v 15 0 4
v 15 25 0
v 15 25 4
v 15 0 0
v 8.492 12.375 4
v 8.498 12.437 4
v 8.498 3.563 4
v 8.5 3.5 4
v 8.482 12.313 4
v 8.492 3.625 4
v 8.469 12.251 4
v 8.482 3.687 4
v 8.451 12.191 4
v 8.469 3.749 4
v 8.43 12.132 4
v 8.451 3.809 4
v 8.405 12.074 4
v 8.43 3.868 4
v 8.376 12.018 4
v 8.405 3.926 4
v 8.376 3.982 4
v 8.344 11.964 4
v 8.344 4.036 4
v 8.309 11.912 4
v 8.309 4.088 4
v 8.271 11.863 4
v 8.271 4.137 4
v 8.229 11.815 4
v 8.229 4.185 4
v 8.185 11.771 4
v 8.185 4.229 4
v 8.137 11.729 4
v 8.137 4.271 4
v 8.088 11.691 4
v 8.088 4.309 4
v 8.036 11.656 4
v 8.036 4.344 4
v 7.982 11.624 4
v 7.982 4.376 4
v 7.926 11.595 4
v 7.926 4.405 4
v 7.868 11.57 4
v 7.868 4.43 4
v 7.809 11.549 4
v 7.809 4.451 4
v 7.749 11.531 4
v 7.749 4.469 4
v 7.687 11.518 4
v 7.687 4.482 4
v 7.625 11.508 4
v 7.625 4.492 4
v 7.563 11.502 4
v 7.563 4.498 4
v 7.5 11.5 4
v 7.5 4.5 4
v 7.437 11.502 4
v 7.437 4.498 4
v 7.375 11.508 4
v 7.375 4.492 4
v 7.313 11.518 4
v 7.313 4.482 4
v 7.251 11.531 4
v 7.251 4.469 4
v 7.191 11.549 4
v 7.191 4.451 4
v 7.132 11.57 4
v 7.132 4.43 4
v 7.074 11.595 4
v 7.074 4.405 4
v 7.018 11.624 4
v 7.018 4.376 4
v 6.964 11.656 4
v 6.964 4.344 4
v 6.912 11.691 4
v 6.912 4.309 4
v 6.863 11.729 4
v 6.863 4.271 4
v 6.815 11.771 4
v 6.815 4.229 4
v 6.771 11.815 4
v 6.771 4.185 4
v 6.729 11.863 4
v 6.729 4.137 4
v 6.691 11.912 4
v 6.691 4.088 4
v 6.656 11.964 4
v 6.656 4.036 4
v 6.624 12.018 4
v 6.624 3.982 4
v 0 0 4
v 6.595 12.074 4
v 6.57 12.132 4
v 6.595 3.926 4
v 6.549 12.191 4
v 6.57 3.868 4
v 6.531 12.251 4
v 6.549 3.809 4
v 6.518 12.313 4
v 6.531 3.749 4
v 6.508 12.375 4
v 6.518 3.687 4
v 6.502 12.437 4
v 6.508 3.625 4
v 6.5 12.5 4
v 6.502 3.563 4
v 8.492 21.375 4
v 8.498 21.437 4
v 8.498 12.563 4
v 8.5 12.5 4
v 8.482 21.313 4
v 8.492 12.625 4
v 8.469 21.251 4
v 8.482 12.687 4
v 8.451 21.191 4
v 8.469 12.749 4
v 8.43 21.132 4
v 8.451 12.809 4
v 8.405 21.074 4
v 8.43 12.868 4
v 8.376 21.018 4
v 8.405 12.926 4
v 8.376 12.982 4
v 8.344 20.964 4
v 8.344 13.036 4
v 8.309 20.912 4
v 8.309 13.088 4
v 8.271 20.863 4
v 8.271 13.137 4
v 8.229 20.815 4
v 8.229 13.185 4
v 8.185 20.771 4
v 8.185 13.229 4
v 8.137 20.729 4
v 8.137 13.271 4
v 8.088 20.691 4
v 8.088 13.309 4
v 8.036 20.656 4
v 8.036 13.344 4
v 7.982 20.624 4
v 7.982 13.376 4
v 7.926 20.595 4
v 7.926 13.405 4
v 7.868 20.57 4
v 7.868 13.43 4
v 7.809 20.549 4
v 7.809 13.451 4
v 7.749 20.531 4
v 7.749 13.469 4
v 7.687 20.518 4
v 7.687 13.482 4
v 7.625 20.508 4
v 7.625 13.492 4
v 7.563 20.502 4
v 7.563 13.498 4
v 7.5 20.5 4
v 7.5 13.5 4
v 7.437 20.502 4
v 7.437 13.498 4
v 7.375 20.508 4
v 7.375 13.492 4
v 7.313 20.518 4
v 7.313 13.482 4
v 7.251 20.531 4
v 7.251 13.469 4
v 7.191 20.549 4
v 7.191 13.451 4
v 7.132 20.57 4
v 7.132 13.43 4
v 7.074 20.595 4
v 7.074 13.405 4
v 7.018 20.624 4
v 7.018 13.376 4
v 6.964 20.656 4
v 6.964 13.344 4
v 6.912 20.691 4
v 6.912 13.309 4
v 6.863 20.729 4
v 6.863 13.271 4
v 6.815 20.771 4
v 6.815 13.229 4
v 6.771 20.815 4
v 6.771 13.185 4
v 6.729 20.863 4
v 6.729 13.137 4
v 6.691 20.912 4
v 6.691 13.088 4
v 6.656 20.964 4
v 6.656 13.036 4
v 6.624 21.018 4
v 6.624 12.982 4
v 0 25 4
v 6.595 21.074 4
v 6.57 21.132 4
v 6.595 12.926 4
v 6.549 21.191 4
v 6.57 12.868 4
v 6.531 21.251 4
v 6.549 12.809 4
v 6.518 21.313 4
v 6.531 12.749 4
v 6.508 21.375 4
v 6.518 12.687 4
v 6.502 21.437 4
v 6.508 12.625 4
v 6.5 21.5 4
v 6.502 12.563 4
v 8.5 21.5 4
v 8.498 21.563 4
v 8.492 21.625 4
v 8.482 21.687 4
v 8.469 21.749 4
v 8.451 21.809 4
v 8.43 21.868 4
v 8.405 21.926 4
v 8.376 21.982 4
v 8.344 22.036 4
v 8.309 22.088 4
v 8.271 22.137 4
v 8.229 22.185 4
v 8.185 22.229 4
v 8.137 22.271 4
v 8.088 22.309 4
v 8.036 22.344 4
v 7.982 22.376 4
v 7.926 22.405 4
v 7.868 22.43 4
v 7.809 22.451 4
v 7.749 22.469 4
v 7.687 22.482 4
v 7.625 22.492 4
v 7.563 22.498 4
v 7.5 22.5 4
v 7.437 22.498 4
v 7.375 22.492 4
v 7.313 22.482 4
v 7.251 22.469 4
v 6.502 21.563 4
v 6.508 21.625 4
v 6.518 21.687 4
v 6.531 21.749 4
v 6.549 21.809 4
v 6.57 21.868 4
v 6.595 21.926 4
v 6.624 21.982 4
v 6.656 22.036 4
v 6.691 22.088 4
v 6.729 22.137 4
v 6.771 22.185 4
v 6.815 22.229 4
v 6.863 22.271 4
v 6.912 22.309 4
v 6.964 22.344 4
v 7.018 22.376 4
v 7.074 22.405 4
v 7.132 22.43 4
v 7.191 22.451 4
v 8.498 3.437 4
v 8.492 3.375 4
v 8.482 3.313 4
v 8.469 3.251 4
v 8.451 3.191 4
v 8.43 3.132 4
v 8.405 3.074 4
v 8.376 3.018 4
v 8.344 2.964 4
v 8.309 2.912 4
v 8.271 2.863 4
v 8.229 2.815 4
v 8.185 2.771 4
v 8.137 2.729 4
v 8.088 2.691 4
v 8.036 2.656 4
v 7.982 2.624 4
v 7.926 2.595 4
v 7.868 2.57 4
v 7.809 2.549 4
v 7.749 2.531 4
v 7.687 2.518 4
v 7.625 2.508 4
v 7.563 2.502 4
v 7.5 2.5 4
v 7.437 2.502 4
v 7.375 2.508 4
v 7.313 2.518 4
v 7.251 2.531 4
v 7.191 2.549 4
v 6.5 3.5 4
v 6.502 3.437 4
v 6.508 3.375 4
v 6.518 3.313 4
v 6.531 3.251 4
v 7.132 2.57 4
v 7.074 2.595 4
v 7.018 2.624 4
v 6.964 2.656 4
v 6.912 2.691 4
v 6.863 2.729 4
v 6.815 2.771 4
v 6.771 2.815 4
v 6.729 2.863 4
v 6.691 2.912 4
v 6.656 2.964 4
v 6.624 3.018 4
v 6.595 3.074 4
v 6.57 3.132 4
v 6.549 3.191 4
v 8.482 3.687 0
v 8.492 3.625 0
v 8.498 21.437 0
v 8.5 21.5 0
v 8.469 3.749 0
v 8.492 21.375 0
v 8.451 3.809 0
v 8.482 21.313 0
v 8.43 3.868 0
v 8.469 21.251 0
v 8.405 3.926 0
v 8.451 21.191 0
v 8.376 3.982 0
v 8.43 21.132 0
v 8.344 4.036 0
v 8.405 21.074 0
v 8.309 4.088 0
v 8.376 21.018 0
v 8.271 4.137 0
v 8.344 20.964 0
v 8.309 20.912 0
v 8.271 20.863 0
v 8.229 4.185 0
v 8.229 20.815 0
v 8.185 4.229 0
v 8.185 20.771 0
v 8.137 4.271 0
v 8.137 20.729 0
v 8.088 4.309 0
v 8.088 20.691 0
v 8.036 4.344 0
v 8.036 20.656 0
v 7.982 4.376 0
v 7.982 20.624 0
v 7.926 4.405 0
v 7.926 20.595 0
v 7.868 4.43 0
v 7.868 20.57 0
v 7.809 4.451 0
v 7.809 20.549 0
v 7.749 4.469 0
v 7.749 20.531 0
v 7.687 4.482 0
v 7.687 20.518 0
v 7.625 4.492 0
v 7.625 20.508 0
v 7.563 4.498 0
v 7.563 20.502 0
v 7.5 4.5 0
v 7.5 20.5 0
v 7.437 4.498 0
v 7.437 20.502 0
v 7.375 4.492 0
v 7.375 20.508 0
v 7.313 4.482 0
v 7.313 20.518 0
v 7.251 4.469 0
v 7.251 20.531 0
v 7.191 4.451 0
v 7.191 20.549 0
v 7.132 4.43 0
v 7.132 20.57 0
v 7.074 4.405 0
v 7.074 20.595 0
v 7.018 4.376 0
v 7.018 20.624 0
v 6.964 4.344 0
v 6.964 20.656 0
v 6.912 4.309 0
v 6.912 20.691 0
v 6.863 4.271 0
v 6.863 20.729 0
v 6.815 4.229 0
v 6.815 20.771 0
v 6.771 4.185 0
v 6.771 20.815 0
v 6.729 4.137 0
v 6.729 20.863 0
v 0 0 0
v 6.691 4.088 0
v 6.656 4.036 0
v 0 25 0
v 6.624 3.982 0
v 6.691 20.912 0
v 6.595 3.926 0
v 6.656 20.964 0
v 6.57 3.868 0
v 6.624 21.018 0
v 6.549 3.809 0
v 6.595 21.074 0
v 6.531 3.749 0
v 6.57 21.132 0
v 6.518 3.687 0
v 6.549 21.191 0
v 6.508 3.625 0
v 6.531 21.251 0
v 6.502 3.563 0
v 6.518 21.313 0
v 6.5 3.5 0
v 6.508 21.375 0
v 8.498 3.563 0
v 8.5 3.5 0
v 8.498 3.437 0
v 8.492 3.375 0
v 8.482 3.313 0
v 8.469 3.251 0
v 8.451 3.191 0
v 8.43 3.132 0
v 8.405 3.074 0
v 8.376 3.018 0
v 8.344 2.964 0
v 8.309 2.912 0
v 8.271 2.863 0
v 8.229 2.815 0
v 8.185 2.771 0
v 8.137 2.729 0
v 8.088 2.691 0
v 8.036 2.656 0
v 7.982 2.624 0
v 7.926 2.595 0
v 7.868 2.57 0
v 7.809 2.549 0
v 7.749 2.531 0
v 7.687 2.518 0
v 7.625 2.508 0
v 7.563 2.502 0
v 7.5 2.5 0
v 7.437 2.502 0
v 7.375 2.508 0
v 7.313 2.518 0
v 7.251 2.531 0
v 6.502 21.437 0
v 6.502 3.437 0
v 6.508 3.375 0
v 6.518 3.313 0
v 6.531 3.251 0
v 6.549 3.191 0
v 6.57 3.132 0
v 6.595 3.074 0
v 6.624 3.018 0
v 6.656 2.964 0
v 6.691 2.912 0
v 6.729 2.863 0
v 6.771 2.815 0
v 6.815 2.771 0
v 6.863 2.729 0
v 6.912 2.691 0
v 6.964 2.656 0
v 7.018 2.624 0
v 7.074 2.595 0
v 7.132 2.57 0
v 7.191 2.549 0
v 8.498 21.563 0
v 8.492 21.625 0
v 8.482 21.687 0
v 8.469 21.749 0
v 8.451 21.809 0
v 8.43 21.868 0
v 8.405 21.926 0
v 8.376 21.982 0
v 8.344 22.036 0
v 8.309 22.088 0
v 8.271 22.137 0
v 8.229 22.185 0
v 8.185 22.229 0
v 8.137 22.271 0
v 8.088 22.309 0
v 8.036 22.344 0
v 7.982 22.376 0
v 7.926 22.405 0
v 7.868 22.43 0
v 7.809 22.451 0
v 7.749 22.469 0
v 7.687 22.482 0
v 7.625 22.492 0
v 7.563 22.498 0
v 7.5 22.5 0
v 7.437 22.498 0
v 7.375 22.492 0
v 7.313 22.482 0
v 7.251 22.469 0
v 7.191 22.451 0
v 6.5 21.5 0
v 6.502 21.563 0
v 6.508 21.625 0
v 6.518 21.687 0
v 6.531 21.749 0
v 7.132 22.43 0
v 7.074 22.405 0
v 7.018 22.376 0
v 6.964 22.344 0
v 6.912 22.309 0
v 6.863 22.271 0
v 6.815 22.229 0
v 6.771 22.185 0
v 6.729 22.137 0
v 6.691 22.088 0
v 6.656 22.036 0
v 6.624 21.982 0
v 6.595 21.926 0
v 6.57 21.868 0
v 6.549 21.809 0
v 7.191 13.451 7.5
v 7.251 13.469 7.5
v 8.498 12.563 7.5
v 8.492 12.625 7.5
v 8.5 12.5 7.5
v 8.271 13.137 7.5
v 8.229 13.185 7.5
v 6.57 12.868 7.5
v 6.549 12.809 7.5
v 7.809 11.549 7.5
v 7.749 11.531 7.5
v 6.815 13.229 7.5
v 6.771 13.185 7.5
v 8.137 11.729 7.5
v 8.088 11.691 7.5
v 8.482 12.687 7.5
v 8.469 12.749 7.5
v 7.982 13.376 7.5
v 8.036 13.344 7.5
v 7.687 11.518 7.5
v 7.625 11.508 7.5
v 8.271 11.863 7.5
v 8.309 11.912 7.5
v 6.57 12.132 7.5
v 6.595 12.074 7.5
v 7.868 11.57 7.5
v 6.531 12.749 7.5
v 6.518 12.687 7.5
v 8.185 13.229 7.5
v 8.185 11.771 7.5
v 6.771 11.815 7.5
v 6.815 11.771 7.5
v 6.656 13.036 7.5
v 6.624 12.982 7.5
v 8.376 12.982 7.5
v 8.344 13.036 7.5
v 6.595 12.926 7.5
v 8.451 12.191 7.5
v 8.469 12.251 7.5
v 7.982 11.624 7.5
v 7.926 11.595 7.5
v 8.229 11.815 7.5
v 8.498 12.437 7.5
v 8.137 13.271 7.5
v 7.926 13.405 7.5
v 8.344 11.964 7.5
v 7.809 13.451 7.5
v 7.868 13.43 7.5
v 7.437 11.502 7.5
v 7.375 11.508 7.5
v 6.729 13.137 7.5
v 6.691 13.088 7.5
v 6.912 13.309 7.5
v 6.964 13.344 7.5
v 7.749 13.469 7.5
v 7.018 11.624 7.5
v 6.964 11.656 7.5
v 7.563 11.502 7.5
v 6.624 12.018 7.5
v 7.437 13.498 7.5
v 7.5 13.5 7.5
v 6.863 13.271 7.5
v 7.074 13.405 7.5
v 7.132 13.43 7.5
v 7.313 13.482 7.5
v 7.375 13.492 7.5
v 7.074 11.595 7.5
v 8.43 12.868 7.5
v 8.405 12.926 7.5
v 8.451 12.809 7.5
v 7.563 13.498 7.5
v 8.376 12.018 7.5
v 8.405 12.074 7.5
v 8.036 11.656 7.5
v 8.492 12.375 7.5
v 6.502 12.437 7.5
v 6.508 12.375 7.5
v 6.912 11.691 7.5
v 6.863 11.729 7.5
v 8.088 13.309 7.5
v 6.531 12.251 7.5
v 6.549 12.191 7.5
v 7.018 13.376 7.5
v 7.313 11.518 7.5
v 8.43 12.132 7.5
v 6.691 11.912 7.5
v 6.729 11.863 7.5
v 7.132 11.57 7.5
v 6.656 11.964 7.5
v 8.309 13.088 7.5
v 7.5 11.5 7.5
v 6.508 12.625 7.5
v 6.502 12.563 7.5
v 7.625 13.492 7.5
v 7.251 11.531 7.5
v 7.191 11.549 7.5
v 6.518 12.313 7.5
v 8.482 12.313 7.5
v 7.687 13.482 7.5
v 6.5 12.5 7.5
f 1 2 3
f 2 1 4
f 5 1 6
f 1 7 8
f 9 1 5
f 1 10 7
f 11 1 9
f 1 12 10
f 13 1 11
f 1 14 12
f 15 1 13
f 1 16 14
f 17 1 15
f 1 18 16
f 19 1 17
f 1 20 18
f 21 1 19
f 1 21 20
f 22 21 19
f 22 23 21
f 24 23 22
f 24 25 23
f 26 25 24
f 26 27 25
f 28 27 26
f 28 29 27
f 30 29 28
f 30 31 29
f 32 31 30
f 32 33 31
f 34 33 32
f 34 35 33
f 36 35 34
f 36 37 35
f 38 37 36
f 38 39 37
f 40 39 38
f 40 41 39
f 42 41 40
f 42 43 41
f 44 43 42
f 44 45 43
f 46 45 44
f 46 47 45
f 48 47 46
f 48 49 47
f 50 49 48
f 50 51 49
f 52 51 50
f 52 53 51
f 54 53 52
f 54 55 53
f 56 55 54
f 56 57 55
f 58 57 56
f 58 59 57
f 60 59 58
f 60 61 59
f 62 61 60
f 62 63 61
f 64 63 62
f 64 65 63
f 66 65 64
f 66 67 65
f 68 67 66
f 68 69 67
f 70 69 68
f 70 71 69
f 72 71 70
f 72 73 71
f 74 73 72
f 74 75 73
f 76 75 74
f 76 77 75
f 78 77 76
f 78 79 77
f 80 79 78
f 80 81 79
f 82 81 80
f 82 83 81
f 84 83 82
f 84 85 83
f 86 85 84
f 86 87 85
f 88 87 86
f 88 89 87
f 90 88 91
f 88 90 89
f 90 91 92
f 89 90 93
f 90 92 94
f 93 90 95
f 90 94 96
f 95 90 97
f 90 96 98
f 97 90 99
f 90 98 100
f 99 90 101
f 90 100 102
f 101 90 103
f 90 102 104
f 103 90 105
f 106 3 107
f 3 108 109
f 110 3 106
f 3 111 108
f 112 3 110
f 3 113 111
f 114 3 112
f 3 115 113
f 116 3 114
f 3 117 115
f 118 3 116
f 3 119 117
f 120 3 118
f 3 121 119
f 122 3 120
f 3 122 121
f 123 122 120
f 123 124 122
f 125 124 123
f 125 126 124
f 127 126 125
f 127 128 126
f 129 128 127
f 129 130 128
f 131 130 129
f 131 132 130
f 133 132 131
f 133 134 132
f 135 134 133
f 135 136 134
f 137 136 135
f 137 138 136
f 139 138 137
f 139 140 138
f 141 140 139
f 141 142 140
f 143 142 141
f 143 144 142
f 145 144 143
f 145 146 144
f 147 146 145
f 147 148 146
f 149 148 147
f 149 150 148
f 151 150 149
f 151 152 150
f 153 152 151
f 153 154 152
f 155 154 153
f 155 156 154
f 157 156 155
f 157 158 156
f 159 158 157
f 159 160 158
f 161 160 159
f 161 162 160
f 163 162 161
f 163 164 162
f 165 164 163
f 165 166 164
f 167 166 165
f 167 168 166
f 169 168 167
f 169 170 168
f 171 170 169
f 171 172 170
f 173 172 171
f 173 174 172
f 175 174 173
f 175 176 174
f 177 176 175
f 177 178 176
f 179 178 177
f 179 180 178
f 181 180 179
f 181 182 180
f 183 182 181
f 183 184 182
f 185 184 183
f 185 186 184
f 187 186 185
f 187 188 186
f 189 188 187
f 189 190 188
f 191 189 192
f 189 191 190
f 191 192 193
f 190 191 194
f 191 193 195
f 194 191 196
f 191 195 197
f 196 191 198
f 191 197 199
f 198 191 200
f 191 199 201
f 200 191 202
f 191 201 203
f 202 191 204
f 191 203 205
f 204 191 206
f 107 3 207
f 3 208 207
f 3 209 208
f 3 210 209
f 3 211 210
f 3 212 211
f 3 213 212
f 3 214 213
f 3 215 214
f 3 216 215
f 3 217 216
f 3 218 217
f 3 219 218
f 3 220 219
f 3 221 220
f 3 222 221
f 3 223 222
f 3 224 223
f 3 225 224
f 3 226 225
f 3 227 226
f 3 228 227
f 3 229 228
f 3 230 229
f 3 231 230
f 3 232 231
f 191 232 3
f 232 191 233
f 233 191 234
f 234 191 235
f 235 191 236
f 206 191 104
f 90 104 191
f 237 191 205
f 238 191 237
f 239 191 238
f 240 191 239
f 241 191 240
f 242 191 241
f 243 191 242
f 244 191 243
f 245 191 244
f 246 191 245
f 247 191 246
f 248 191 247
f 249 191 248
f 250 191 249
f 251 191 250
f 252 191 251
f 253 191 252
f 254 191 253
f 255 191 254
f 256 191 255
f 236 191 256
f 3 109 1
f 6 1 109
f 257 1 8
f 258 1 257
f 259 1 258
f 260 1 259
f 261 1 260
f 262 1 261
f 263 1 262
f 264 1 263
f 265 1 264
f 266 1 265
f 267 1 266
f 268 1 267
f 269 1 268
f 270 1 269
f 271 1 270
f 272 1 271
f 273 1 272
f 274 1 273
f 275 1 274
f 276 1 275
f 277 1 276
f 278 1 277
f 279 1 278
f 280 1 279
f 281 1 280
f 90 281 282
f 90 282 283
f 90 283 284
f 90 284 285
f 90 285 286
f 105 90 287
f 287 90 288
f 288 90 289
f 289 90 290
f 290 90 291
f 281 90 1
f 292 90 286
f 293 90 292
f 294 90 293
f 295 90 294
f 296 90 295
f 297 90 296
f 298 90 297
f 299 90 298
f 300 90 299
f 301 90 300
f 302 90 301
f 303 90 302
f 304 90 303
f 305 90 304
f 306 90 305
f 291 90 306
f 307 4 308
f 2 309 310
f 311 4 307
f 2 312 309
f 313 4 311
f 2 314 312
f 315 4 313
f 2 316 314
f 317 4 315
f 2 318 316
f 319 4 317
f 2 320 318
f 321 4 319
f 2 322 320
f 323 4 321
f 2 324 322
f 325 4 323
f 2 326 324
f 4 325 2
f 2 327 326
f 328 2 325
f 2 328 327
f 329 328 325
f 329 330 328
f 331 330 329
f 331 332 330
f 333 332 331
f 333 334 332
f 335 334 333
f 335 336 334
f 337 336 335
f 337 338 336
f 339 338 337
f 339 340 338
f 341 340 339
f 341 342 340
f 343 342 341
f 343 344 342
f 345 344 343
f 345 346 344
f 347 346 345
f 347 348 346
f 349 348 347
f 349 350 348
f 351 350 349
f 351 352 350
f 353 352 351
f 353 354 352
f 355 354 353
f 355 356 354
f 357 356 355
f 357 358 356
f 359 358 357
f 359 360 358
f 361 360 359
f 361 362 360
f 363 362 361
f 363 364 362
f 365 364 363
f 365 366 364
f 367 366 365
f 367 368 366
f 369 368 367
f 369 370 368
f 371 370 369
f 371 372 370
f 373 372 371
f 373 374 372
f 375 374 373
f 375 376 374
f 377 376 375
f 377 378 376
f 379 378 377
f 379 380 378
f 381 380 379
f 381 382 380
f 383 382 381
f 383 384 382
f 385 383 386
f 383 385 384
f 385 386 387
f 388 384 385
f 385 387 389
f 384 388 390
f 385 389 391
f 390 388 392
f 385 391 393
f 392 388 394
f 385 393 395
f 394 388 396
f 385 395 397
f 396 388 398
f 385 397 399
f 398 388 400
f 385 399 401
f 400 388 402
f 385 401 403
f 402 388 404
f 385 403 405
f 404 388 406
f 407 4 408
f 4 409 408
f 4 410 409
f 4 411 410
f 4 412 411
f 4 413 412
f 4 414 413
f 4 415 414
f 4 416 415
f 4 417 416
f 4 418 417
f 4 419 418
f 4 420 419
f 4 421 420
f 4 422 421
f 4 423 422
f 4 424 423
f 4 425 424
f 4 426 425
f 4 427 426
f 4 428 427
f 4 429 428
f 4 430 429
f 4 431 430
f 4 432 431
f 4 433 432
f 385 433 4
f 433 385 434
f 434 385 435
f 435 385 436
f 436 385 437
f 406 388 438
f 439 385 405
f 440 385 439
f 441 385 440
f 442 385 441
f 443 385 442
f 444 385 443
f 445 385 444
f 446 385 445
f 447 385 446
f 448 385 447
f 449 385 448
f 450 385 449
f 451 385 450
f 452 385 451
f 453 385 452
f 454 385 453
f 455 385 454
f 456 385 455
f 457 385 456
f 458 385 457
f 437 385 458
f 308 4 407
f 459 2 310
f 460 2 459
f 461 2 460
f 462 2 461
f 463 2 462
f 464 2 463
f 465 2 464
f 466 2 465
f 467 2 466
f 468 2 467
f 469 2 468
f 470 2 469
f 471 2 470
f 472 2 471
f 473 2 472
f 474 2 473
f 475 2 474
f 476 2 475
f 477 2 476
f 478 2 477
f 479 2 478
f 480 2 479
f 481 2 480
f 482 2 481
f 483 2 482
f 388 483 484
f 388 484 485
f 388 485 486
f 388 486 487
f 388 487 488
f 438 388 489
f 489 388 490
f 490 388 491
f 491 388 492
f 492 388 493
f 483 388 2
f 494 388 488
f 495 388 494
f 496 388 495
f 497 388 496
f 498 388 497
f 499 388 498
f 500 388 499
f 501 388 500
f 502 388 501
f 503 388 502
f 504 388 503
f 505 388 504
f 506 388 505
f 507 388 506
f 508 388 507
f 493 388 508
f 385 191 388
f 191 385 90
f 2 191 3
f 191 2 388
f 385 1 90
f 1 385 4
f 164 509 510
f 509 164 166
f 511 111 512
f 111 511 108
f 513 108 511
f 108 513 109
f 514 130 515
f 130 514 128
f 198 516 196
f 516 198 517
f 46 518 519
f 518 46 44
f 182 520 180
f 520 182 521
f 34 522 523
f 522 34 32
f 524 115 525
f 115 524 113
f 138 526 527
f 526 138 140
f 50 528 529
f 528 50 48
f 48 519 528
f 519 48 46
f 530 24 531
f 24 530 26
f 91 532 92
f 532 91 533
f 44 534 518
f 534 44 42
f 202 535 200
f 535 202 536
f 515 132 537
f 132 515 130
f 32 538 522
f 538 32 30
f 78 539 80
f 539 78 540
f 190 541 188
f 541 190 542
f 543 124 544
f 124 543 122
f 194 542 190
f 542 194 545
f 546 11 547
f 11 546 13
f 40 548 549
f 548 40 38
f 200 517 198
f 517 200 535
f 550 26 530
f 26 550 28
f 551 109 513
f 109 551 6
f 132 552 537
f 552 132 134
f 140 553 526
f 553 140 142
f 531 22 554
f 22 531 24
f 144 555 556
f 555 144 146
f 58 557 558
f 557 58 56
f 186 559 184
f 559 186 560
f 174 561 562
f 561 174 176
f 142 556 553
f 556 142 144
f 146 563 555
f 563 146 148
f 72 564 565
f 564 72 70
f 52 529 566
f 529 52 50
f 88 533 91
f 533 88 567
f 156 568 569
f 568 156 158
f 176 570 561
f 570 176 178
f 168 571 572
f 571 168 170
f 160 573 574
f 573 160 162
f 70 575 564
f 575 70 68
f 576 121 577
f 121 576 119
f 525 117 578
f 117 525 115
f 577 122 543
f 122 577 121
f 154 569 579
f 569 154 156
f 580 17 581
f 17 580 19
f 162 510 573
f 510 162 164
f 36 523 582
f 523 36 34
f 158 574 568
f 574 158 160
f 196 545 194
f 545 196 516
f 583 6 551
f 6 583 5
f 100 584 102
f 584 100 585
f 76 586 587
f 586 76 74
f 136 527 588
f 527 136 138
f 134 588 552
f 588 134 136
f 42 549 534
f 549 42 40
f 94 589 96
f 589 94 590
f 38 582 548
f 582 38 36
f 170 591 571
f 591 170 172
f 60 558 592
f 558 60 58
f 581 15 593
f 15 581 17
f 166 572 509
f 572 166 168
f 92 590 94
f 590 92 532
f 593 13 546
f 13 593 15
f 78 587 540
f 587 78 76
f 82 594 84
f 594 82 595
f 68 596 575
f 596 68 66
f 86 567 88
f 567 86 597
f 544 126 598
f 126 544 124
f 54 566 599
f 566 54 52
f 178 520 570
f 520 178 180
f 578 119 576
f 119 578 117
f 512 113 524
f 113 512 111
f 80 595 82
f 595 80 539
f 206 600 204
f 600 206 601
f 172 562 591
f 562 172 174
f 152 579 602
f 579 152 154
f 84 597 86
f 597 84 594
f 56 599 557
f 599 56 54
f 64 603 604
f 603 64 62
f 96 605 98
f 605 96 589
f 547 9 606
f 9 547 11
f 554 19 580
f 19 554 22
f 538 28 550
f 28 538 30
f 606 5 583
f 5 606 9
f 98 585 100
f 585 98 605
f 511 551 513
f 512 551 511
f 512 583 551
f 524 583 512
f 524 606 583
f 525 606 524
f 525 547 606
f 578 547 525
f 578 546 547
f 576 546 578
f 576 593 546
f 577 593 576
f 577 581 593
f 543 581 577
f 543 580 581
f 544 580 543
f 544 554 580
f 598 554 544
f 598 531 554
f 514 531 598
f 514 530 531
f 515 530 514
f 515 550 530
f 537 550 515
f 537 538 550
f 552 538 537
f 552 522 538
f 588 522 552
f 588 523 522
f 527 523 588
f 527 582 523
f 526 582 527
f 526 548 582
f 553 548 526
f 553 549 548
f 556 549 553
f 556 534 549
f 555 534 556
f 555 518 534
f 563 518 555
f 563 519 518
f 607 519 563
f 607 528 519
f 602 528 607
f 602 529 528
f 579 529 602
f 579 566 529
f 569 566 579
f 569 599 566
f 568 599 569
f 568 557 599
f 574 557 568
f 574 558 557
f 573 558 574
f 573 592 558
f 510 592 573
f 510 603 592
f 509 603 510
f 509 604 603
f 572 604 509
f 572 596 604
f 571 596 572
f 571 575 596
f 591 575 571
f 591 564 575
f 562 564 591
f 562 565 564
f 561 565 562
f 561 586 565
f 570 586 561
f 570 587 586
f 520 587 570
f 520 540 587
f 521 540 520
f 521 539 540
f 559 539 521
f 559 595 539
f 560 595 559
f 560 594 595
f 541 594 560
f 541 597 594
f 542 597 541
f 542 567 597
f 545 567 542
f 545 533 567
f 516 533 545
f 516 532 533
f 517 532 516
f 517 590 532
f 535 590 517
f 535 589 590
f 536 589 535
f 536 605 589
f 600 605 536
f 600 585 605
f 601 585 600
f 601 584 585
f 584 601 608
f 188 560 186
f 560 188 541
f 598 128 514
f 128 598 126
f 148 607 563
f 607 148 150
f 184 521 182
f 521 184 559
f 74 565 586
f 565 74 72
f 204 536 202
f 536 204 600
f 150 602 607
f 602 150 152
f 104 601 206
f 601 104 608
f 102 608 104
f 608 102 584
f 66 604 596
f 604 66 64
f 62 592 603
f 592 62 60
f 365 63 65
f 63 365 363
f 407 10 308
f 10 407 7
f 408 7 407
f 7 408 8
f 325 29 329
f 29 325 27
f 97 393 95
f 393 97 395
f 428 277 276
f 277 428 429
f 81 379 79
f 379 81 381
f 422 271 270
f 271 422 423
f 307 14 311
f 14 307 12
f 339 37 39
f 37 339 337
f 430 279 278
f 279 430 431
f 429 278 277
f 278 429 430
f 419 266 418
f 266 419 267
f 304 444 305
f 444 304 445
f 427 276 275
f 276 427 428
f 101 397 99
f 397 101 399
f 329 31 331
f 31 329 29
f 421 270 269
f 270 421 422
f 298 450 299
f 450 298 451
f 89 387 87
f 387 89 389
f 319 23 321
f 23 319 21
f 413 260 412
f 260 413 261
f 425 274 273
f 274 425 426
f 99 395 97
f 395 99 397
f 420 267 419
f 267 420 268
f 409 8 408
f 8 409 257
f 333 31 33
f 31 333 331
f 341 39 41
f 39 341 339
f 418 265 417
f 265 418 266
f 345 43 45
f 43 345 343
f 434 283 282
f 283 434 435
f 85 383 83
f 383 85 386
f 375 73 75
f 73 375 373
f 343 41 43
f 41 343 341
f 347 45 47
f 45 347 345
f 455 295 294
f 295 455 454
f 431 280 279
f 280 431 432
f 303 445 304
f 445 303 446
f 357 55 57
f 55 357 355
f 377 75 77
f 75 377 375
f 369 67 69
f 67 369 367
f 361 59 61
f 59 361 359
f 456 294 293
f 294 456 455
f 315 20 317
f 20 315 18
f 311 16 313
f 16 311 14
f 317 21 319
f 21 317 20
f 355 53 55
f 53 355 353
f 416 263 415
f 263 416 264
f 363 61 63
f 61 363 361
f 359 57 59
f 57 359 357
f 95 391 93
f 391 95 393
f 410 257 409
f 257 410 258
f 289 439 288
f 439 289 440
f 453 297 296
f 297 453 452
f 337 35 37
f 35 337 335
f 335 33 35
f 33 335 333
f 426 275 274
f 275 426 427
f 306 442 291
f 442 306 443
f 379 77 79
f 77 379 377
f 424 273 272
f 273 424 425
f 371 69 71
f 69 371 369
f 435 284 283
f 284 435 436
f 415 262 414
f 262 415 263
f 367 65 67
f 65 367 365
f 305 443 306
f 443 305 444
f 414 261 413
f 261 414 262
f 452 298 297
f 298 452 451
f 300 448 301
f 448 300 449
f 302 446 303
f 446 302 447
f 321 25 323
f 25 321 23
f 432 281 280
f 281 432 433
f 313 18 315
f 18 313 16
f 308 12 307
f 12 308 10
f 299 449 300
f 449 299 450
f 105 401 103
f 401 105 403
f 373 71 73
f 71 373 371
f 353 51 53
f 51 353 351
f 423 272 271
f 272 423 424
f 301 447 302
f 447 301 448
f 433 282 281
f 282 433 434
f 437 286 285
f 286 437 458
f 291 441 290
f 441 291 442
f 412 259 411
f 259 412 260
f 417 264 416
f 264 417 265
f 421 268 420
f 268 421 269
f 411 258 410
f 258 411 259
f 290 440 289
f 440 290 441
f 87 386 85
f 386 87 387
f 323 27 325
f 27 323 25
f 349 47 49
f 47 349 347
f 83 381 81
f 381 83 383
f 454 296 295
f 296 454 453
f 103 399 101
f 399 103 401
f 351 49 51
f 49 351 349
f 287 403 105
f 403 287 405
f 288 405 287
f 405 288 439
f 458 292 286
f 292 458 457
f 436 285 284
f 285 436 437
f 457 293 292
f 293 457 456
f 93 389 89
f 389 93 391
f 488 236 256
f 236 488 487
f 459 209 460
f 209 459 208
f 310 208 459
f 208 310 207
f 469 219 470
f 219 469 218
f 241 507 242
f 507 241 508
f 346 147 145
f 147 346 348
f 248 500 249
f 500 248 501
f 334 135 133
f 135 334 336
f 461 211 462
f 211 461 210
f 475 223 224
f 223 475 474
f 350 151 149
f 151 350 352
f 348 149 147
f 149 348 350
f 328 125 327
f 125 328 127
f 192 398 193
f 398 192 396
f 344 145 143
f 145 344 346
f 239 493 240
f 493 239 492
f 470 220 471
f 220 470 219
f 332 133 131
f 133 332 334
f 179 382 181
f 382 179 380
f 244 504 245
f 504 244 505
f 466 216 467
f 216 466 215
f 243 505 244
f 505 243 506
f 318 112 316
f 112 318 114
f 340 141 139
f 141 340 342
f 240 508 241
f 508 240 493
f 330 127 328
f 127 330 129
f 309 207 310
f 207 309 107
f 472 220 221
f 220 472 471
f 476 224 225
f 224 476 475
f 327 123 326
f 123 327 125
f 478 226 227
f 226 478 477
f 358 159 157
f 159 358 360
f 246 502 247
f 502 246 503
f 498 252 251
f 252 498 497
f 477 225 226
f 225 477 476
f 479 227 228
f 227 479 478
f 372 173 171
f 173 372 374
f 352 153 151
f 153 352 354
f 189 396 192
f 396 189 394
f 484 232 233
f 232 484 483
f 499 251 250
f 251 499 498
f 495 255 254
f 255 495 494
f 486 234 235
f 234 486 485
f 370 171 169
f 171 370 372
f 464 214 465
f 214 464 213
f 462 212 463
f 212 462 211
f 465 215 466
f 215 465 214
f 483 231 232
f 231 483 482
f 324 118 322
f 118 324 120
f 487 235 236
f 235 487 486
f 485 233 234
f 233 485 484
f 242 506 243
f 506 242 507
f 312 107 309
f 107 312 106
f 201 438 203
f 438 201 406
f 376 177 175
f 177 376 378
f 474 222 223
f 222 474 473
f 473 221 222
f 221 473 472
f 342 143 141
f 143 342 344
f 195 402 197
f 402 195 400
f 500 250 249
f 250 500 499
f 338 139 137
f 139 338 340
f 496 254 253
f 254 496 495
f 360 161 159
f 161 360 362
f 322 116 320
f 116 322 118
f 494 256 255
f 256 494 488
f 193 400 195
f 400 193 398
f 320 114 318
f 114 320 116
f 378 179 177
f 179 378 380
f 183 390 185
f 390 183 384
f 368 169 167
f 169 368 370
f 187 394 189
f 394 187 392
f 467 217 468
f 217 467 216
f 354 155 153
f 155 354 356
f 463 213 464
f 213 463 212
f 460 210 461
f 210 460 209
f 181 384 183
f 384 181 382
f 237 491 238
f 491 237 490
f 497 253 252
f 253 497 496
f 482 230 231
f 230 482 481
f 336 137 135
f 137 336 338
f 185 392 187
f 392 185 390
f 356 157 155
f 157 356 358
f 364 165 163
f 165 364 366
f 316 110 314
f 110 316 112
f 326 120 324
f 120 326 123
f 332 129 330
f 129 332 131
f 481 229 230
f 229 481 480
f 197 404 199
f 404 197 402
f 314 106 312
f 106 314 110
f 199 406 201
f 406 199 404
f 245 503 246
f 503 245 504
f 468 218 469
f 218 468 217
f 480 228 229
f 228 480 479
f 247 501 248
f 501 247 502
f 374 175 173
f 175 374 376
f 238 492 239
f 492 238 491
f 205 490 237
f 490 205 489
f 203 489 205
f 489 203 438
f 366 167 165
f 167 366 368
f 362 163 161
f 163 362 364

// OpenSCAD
difference(){
	union(){
        
        translate([0,0,0]){
           cube([15,25,4], center=false);
        }
       translate([7.5,12.5,4]){
            rotate(a = [0,0,0]) {
                cylinder(h=7, r=1.0, $fn=100, center=true);
            }
       }			   
		   

	}
	union() {
       translate([7.5,3.5,0]){
            rotate(a = [0,0,0]) {
                cylinder(h=600, r=1.0, $fn=100, center=true);
            }
       }			   
       translate([7.5,21.5,0]){
            rotate(a = [0,0,0]) {
                cylinder(h=600, r=1.0, $fn=100, center=true);
            }
       }			   

        
	}
}
